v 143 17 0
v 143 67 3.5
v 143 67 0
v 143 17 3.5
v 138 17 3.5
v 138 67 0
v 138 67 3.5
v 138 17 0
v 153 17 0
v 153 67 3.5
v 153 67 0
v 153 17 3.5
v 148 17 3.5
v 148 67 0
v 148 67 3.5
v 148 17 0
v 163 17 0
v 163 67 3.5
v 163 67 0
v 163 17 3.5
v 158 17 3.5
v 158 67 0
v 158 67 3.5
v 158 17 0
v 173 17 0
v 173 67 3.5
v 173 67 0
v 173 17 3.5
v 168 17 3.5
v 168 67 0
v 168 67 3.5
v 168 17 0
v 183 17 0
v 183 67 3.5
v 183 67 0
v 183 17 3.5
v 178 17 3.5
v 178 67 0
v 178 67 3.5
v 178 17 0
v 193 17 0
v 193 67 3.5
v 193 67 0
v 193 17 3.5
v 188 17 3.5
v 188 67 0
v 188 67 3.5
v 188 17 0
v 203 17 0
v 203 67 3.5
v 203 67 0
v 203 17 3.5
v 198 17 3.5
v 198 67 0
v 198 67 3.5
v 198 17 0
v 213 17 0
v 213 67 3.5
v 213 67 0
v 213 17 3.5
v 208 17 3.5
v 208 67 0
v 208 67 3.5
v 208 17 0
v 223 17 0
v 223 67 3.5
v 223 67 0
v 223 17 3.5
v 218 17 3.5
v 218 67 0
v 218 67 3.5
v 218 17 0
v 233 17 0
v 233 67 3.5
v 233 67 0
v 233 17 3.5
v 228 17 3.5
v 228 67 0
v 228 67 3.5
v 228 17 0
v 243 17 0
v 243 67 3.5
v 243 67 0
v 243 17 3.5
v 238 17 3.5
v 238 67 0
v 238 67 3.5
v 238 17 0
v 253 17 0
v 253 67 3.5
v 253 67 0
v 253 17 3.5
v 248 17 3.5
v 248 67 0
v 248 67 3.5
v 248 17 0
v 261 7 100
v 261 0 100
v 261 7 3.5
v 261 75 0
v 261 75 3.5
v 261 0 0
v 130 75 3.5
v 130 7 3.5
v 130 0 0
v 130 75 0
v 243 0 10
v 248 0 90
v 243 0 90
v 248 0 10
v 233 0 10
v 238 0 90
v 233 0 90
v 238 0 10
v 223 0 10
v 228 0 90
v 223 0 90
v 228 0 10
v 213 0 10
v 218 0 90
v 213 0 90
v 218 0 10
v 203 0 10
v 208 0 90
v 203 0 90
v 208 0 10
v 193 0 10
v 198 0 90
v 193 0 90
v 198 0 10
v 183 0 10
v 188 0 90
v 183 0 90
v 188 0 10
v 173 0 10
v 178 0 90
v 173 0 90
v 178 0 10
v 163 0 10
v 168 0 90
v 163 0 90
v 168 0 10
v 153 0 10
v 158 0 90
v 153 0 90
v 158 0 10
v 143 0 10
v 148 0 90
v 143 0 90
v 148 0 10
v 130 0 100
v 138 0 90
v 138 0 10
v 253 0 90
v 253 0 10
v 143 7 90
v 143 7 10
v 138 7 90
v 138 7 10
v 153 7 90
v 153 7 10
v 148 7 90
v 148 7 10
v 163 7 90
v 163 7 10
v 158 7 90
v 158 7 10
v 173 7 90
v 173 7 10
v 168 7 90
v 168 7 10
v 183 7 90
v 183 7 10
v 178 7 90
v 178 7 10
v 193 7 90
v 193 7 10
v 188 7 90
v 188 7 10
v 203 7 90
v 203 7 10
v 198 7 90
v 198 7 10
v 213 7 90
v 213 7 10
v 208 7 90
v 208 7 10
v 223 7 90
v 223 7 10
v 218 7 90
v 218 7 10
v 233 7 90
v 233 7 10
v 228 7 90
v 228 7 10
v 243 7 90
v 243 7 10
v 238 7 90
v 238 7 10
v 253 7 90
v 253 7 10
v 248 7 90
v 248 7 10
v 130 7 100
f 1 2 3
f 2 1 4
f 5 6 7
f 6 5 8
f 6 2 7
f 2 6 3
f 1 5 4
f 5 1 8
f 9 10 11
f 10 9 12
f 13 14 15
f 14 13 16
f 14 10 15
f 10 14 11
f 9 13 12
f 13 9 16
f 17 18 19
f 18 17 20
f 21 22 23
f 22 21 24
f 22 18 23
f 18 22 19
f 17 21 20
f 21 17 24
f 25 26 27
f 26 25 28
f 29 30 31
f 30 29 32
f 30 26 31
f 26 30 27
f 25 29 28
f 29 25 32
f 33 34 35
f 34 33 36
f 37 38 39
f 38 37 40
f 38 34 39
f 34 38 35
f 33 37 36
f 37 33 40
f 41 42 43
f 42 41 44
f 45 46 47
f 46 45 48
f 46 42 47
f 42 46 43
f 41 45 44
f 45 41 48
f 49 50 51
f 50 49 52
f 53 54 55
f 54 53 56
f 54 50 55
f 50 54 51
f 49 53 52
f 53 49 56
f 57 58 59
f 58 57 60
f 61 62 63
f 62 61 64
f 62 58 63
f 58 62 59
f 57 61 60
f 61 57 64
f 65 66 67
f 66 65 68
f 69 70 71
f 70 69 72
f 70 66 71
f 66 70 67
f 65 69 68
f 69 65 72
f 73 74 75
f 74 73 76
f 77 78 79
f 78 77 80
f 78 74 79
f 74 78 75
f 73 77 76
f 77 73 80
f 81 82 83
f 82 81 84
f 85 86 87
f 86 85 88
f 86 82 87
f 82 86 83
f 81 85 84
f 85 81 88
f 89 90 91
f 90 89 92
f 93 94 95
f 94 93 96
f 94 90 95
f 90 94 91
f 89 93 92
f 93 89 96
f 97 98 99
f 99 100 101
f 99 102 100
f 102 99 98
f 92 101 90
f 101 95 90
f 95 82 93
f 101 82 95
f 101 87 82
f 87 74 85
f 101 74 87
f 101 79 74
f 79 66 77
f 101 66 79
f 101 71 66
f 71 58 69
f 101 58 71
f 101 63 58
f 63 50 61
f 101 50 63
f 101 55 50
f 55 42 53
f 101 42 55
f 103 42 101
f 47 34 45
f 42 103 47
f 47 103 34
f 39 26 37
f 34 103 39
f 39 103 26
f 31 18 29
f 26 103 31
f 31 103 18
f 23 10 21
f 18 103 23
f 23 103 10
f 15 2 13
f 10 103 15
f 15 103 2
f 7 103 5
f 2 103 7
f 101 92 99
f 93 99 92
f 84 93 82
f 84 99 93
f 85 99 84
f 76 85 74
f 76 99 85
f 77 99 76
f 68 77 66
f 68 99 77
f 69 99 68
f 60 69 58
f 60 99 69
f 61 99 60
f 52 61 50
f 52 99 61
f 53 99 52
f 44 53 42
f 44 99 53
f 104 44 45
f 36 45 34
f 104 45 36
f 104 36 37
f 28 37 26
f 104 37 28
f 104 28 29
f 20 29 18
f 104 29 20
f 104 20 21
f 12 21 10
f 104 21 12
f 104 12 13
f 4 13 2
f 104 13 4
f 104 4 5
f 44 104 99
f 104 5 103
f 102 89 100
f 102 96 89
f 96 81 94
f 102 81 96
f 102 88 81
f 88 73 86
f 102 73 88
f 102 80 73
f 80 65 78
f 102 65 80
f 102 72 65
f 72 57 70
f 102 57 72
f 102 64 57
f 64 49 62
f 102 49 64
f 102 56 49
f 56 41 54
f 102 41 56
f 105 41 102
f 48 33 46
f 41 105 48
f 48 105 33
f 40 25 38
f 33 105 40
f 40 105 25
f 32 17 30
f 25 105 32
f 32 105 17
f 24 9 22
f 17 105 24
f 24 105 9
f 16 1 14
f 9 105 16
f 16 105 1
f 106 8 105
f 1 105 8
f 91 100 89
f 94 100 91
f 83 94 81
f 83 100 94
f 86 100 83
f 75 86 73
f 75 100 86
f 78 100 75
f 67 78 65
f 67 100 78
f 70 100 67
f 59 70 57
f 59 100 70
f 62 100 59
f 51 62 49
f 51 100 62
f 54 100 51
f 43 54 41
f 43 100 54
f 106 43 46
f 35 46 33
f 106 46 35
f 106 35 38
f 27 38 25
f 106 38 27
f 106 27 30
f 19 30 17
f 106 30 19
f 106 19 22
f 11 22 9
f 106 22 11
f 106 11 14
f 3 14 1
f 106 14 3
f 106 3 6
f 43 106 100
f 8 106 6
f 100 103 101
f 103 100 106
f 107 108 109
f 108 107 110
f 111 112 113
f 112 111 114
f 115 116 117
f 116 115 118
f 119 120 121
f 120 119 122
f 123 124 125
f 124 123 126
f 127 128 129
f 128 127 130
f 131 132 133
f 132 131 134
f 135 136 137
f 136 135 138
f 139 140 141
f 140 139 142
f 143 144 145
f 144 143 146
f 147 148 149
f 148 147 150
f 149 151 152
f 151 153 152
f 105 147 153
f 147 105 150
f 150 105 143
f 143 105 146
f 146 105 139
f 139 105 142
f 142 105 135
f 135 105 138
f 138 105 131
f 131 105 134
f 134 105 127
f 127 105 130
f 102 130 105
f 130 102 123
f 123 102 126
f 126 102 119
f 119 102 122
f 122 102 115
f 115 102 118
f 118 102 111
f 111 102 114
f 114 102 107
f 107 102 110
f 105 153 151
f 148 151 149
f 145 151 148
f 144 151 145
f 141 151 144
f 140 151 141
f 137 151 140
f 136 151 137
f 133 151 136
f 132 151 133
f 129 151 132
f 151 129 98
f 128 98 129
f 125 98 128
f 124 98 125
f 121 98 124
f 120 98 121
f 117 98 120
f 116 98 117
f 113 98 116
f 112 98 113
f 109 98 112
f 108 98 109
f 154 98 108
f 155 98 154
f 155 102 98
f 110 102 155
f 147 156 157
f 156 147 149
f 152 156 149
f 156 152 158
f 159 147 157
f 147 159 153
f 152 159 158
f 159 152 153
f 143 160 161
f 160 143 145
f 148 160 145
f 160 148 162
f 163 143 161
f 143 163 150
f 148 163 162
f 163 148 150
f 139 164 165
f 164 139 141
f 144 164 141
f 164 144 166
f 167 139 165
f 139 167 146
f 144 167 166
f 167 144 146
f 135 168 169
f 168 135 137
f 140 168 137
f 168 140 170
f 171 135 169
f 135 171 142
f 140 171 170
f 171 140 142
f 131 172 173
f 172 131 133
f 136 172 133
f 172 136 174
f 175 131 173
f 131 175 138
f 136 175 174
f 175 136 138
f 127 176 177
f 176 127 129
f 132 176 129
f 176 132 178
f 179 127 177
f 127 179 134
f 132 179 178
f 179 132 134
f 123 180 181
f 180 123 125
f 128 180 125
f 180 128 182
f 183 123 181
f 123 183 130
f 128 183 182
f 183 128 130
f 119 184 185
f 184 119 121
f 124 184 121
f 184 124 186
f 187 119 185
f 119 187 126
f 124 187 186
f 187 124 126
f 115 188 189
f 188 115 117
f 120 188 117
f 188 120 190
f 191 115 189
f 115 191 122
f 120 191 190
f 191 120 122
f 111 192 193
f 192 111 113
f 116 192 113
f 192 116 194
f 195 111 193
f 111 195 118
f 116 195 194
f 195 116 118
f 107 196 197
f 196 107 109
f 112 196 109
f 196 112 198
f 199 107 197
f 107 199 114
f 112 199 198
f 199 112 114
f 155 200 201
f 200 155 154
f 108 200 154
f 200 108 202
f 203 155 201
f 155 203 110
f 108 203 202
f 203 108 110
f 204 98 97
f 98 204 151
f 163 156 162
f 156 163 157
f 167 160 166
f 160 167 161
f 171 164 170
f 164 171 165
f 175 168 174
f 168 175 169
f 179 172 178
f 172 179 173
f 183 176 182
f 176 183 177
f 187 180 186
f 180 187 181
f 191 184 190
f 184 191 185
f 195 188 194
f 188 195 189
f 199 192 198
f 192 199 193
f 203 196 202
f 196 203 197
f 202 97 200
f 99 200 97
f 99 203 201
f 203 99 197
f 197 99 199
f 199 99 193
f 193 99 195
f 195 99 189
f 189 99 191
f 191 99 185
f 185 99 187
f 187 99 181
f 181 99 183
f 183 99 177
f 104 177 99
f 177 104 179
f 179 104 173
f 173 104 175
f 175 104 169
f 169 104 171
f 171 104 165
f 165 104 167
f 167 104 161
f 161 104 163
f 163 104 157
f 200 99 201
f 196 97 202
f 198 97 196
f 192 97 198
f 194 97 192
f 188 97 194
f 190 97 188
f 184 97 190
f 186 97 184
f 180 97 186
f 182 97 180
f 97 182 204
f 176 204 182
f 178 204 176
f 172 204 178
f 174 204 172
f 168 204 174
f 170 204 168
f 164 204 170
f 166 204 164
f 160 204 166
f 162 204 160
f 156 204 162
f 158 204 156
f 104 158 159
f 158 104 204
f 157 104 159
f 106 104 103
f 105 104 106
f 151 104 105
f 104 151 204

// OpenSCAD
fan_x=120;
fan_y=120;

brace_z=7;
brace_y_offset = 125;
brace_x= 2 * fan_x + 3*brace_z;
brace_y = fan_y + 15;

brace_base=50;


difference(){
    
    union(){

        difference(){
            color("purple")
            cube([brace_x,1.5*brace_base,brace_z/2]);
            for(vent = [0 : 1 : 11]){
                translate([ 138 + 10 * vent ,brace_z + 10, -5])
                cube([5, brace_base, 2 * brace_z]);
            }
        }
            
        difference(){
            color("red")
            cube([brace_x,brace_z, 100]);
            for(vent = [0 : 1 : 11]){
                translate([ 138 + 10 * vent ,-5 , brace_z+3])
                cube([5,2 * brace_z, fan_y/1.5]);
            }
        }


        rotate([-10,0,0]){
            translate([0,-22,-5])
            translate([0,0,brace_y_offset]) {
                union(){
                    translate([35,0,5]){
                        rotate([270, 180, 0]) {
                            difference(){
                                cube([30,30,7]);
                                translate([0,0,-5])
                                rotate([0,0,45])
                                cube([60,60,14]);
                            }
                        }
                    }
                    
                    translate([35,7,125]){
                        rotate([90, 180, 0]) {
                            difference(){
                                cube([30,30,7]);
                                translate([0,0,-5])
                                rotate([0,0,45])
                                cube([60,60,14]);
                            }
                        }
                    }
                    
                    translate([98,0,125]){
                        rotate([270, 0, 0]) {
                            difference(){
                                cube([30,30,7]);
                                translate([0,0,-5])
                                rotate([0,0,45])
                                cube([60,60,14]);
                            }
                        }
                    }
                    
                    translate([98,7,5]){
                        rotate([90, 0, 0]) {
                            difference(){
                                cube([30,30,7]);
                                translate([0,0,-5])
                                rotate([0,0,45])
                                cube([60,60,14]);
                            }
                        }
                    }
                    
                    
                    translate([225,0,125]){
                        rotate([270, 0, 0]) {
                            difference(){
                                cube([30,30,7]);
                                translate([0,0,-5])
                                rotate([0,0,45])
                                cube([60,60,14]);
                            }
                        }
                    }
                    
                    translate([225,7,5]){
                        rotate([90, 0, 0]) {
                            difference(){
                                cube([30,30,7]);
                                translate([0,0,-5])
                                rotate([0,0,45])
                                cube([60,60,14]);
                            }
                        }
                    }
                    
                    translate([163,0,5]){
                        rotate([270, 180, 0]) {
                            difference(){
                                cube([30,30,7]);
                                translate([0,0,-5])
                                rotate([0,0,45])
                                cube([60,60,14]);
                            }
                        }
                    }
                    
                    translate([163,7,125]){
                        rotate([90, 180, 0]) {
                            difference(){
                                cube([30,30,7]);
                                translate([0,0,-5])
                                rotate([0,0,45])
                                cube([60,60,14]);
                            }
                        }
                    }
                    
                    
                    difference(){
                        color("blue")
                        cube([brace_x,brace_z, brace_y]);

                        color("green")
                        translate([brace_z,-20,5]) 
                        cube([fan_x,60, 120]);
                        
                        color("green")
                        translate([fan_x+ (2*brace_z),-20,5]) 
                        cube([fan_x,60, 120]);
                    }
                }
            }
        }
    }
    
    translate([-170,-100,-6])
    cube([300,300, 300]);
    
    translate([-10,-100,120])
    cube([400,300, 300]);
}
